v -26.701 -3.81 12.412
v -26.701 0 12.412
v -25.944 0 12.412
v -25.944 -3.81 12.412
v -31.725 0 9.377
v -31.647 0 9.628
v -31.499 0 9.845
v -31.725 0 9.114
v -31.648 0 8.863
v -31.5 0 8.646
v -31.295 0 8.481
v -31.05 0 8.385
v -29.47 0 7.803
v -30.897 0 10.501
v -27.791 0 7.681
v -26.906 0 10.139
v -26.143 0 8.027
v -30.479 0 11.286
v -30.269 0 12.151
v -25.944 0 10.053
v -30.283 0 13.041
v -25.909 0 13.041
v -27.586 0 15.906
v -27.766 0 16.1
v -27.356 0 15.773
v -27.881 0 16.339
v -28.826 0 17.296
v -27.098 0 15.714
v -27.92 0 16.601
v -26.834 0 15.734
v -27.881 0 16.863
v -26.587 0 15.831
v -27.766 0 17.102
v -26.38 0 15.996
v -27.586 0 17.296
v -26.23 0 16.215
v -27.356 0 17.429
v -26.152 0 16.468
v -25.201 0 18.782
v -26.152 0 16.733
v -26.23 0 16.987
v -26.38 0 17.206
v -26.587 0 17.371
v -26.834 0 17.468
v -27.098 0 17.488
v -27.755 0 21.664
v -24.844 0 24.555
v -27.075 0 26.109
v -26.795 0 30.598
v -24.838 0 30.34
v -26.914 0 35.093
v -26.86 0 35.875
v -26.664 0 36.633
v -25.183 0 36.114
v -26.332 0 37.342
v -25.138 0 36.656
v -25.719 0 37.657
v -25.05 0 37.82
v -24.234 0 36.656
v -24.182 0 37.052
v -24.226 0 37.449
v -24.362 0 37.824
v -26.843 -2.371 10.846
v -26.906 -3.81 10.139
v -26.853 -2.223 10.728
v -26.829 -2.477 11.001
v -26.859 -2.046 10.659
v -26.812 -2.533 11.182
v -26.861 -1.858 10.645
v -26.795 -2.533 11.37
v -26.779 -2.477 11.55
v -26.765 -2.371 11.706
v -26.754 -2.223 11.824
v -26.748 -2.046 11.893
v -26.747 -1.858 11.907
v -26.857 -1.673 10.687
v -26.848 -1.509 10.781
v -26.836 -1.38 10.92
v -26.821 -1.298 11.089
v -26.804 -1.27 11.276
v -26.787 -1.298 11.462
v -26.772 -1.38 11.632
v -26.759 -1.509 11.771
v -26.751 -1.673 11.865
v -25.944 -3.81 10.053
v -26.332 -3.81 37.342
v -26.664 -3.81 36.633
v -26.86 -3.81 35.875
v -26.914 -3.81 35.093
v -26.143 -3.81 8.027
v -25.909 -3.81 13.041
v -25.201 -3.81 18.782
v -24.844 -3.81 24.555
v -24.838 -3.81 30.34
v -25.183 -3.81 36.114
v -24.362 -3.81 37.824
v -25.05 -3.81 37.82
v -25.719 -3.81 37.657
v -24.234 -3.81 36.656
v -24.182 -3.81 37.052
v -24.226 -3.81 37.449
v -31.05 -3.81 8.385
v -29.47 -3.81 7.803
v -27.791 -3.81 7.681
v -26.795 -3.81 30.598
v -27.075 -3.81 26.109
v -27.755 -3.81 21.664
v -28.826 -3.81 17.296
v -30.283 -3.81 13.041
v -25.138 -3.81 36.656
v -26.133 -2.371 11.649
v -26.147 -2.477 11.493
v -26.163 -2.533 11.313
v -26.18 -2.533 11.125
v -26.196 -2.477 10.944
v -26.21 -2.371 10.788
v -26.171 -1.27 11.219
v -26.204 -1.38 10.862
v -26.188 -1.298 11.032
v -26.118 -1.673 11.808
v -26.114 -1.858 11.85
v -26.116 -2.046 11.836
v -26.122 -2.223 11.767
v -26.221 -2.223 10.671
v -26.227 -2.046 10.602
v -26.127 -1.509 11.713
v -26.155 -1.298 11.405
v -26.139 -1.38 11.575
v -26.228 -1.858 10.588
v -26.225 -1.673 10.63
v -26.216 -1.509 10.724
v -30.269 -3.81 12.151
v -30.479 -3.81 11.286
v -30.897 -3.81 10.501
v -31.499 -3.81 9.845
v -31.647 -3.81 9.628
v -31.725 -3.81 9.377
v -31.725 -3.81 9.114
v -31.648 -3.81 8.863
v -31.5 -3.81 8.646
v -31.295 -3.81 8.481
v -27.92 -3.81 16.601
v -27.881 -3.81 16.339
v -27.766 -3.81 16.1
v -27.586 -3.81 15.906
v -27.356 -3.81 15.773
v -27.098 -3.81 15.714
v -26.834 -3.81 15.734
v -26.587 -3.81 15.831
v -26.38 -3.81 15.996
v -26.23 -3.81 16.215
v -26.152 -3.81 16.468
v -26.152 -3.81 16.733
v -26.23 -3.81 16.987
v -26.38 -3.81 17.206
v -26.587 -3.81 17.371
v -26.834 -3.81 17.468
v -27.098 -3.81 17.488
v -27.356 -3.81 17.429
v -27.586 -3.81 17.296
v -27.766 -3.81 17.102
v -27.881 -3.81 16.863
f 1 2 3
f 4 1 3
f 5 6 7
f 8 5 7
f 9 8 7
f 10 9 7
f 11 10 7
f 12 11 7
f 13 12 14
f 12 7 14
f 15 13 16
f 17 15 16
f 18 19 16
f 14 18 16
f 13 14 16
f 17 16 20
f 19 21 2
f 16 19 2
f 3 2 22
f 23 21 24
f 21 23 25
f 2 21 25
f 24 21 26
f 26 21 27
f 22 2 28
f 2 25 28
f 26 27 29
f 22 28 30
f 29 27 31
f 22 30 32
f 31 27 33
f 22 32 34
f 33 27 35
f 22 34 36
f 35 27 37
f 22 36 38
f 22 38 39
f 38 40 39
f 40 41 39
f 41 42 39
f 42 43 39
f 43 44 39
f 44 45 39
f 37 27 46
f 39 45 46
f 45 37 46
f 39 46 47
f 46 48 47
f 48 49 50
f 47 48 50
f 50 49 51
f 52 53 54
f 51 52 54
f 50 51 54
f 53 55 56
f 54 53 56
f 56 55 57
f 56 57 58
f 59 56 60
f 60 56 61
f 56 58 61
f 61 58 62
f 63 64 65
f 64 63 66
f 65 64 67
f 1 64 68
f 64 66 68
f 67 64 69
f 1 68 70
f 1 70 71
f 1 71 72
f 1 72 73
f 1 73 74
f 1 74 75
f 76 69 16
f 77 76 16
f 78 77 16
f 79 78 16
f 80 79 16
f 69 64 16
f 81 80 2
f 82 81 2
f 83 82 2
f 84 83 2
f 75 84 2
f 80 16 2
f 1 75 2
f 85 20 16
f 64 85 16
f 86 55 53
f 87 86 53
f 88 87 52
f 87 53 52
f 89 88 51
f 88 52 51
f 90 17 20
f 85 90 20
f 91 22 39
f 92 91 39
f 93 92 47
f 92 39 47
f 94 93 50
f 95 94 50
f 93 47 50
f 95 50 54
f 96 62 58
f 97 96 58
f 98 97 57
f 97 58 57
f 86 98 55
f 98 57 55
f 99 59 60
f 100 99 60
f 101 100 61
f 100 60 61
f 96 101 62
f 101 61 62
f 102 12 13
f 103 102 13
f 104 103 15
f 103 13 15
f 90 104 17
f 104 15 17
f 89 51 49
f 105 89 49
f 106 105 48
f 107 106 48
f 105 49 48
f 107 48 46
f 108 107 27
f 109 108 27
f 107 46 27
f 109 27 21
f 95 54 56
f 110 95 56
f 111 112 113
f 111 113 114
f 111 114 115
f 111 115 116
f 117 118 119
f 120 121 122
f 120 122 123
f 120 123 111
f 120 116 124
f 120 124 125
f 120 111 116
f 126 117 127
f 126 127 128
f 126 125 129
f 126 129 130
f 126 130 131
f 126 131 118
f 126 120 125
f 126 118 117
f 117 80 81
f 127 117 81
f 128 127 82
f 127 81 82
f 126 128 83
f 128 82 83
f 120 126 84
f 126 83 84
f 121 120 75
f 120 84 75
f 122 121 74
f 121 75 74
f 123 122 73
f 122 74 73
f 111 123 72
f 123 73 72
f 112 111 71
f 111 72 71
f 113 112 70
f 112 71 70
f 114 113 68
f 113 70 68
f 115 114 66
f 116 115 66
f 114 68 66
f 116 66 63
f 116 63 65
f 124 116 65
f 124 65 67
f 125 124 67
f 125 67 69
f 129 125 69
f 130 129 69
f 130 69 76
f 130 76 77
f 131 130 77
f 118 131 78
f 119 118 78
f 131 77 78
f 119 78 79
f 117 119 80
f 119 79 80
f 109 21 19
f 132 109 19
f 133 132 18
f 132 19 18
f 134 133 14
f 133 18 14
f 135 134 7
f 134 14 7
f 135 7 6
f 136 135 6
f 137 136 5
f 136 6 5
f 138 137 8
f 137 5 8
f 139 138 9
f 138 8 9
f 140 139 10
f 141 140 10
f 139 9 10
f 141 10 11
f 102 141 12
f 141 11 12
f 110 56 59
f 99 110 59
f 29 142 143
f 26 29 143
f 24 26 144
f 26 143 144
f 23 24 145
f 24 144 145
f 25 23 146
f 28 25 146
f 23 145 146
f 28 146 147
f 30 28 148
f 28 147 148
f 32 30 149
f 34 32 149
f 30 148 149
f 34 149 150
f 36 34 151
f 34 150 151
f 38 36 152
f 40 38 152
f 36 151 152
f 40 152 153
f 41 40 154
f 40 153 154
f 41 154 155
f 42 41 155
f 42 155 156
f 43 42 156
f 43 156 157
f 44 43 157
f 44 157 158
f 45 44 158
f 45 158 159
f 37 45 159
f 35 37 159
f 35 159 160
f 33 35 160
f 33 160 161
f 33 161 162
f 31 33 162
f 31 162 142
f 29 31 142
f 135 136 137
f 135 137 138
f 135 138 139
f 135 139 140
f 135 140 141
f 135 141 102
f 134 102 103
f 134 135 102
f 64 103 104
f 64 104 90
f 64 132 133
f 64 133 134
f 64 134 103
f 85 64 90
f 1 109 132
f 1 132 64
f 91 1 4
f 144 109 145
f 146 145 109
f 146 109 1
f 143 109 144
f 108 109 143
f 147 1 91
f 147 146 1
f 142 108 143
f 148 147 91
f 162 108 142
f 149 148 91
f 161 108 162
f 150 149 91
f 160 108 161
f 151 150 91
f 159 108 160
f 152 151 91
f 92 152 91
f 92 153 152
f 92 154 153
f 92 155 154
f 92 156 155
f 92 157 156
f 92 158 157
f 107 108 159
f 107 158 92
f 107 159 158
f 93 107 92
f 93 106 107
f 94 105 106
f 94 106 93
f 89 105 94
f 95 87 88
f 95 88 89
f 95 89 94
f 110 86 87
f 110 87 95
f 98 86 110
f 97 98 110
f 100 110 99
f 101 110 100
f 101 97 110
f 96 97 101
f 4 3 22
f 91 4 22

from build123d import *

# Parameters (mm, degrees)
F1_DEPTH = 3.81
F4_D     = 1.778
F5_R     = 0.6352589674
F6_DEPTH = 0.635


# Not quite as in the source:
# - a feature of the source that left no trace in its solid (it failed there, or was rolled back) is left out
# - a feature names something its author has since deleted; it is built from what else it names


with BuildPart() as f1:
    # F0 (on Front) → F1 (new body)
    with BuildSketch(Plane.XZ):
        with BuildLine():
            ThreePointArc((-31.4986416626, 9.8449740097), (-31.6959768892, 8.9855931424), (-31.0501495083, 8.3852735102))
            ThreePointArc((-31.0501495083, 8.3852735102), (-28.6350189428, 7.6831870892), (-26.1434996057, 8.026861912))
            Line((-26.1434996057, 8.026861912), (-25.9436036256, 10.0525402048))
            Line((-25.9436036256, 10.0525402048), (-26.9064083695, 10.1394830272))
            Line((-26.9064083695, 10.1394830272), (-26.7011658463, 12.4123385609))
            Line((-26.7011658463, 12.4123385609), (-25.9436036256, 12.4123385609))
            Line((-25.9436036256, 12.4123385609), (-25.9087286158, 13.0410402551))
            ThreePointArc((-25.9087286158, 13.0410402551), (-24.8435996749, 24.5554030542), (-25.1834829825, 36.1139293298))
            Line((-25.1834829825, 36.1139293298), (-25.1380671304, 36.6562315202))
            Line((-25.1380671304, 36.6562315202), (-24.2339836005, 36.6562315202))
            ThreePointArc((-24.2339836005, 36.6562315202), (-24.1923341682, 37.2519069884), (-24.3619682602, 37.8244349033))
            ThreePointArc((-24.3619682602, 37.8244349033), (-25.3896581056, 37.7581269753), (-26.3316547054, 37.3419712767))
            ThreePointArc((-26.3316547054, 37.3419712767), (-26.7797456815, 36.2582545781), (-26.9143641051, 35.0933059588))
            ThreePointArc((-26.9143641051, 35.0933059588), (-27.3654380994, 23.8788044049), (-30.282865234, 13.0410402552))
            ThreePointArc((-30.282865234, 13.0410402552), (-30.4786310467, 11.2862366956), (-31.4986416626, 9.8449740097))
        make_face()
    extrude(amount=F1_DEPTH)

    # F4 (through all)
    with Locations(Plane(origin=(0, 0, 0), x_dir=(1, 0, 0), z_dir=(0, 1, 0))):
        with Locations((-27.0313583314, -16.6009981185)):
            Hole(F4_D / 2)

    # F5 (on face) → F6 (join)
    with BuildSketch(Plane(origin=(-27.5969837191, 0, 2.4920521733), x_dir=(0, 1, 0), z_dir=(0.9959475762, 0, -0.0899356737))):
        with Locations((-1.905, 8.8195993749)):
            Circle(F5_R)
    extrude(amount=F6_DEPTH)


solid = f1.part
